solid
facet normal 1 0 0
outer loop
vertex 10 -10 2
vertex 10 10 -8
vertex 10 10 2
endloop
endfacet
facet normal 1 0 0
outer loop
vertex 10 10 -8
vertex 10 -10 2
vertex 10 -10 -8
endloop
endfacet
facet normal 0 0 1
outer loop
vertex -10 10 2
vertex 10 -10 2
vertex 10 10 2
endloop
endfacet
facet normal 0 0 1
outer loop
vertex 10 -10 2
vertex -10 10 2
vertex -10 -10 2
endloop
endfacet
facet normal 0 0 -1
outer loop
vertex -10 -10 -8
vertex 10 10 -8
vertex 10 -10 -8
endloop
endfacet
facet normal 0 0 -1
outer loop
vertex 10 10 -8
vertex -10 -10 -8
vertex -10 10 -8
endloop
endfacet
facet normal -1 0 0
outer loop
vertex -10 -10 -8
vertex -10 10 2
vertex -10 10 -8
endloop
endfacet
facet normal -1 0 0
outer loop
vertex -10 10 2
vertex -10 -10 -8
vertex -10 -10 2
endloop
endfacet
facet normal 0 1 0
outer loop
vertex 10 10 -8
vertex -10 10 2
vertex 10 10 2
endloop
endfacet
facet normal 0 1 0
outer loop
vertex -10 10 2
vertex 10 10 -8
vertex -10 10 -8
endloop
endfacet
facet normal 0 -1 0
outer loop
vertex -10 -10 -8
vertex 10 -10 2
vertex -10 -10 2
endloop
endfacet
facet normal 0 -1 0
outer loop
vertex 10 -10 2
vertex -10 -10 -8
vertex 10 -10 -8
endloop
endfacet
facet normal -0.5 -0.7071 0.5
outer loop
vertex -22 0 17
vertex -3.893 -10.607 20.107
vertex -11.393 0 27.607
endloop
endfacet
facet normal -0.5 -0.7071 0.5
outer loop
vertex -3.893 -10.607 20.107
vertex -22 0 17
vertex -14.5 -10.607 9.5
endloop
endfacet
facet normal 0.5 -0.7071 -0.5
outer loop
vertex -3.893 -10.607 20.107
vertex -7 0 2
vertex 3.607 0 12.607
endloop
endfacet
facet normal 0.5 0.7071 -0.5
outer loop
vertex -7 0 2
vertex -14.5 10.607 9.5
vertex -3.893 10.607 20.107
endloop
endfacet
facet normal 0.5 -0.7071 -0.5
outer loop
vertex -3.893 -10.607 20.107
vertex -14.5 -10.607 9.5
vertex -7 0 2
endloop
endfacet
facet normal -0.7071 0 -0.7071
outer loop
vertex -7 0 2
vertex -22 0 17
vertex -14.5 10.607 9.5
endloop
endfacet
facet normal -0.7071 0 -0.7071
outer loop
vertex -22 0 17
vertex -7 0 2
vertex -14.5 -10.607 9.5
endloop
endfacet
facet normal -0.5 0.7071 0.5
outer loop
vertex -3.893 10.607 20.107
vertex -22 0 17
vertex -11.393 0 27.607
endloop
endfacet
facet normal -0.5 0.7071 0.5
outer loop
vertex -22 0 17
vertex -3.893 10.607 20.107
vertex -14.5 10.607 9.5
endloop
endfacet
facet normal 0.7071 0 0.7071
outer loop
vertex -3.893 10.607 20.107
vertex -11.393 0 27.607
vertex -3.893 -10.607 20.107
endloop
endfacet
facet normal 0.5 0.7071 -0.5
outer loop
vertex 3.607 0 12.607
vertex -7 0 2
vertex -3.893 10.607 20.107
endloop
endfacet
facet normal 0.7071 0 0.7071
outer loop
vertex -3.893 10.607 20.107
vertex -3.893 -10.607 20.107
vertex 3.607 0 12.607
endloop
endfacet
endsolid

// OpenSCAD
/* coincident tests */
translate([0,0,2]) {
    translate([0,0,-5]) {
        cube([20,20,10], center=true);
    }
    translate([-7,0,0]) {
        rotate([45,-45,0]) {
            cube([15,15,15]);
        }
    }
}
